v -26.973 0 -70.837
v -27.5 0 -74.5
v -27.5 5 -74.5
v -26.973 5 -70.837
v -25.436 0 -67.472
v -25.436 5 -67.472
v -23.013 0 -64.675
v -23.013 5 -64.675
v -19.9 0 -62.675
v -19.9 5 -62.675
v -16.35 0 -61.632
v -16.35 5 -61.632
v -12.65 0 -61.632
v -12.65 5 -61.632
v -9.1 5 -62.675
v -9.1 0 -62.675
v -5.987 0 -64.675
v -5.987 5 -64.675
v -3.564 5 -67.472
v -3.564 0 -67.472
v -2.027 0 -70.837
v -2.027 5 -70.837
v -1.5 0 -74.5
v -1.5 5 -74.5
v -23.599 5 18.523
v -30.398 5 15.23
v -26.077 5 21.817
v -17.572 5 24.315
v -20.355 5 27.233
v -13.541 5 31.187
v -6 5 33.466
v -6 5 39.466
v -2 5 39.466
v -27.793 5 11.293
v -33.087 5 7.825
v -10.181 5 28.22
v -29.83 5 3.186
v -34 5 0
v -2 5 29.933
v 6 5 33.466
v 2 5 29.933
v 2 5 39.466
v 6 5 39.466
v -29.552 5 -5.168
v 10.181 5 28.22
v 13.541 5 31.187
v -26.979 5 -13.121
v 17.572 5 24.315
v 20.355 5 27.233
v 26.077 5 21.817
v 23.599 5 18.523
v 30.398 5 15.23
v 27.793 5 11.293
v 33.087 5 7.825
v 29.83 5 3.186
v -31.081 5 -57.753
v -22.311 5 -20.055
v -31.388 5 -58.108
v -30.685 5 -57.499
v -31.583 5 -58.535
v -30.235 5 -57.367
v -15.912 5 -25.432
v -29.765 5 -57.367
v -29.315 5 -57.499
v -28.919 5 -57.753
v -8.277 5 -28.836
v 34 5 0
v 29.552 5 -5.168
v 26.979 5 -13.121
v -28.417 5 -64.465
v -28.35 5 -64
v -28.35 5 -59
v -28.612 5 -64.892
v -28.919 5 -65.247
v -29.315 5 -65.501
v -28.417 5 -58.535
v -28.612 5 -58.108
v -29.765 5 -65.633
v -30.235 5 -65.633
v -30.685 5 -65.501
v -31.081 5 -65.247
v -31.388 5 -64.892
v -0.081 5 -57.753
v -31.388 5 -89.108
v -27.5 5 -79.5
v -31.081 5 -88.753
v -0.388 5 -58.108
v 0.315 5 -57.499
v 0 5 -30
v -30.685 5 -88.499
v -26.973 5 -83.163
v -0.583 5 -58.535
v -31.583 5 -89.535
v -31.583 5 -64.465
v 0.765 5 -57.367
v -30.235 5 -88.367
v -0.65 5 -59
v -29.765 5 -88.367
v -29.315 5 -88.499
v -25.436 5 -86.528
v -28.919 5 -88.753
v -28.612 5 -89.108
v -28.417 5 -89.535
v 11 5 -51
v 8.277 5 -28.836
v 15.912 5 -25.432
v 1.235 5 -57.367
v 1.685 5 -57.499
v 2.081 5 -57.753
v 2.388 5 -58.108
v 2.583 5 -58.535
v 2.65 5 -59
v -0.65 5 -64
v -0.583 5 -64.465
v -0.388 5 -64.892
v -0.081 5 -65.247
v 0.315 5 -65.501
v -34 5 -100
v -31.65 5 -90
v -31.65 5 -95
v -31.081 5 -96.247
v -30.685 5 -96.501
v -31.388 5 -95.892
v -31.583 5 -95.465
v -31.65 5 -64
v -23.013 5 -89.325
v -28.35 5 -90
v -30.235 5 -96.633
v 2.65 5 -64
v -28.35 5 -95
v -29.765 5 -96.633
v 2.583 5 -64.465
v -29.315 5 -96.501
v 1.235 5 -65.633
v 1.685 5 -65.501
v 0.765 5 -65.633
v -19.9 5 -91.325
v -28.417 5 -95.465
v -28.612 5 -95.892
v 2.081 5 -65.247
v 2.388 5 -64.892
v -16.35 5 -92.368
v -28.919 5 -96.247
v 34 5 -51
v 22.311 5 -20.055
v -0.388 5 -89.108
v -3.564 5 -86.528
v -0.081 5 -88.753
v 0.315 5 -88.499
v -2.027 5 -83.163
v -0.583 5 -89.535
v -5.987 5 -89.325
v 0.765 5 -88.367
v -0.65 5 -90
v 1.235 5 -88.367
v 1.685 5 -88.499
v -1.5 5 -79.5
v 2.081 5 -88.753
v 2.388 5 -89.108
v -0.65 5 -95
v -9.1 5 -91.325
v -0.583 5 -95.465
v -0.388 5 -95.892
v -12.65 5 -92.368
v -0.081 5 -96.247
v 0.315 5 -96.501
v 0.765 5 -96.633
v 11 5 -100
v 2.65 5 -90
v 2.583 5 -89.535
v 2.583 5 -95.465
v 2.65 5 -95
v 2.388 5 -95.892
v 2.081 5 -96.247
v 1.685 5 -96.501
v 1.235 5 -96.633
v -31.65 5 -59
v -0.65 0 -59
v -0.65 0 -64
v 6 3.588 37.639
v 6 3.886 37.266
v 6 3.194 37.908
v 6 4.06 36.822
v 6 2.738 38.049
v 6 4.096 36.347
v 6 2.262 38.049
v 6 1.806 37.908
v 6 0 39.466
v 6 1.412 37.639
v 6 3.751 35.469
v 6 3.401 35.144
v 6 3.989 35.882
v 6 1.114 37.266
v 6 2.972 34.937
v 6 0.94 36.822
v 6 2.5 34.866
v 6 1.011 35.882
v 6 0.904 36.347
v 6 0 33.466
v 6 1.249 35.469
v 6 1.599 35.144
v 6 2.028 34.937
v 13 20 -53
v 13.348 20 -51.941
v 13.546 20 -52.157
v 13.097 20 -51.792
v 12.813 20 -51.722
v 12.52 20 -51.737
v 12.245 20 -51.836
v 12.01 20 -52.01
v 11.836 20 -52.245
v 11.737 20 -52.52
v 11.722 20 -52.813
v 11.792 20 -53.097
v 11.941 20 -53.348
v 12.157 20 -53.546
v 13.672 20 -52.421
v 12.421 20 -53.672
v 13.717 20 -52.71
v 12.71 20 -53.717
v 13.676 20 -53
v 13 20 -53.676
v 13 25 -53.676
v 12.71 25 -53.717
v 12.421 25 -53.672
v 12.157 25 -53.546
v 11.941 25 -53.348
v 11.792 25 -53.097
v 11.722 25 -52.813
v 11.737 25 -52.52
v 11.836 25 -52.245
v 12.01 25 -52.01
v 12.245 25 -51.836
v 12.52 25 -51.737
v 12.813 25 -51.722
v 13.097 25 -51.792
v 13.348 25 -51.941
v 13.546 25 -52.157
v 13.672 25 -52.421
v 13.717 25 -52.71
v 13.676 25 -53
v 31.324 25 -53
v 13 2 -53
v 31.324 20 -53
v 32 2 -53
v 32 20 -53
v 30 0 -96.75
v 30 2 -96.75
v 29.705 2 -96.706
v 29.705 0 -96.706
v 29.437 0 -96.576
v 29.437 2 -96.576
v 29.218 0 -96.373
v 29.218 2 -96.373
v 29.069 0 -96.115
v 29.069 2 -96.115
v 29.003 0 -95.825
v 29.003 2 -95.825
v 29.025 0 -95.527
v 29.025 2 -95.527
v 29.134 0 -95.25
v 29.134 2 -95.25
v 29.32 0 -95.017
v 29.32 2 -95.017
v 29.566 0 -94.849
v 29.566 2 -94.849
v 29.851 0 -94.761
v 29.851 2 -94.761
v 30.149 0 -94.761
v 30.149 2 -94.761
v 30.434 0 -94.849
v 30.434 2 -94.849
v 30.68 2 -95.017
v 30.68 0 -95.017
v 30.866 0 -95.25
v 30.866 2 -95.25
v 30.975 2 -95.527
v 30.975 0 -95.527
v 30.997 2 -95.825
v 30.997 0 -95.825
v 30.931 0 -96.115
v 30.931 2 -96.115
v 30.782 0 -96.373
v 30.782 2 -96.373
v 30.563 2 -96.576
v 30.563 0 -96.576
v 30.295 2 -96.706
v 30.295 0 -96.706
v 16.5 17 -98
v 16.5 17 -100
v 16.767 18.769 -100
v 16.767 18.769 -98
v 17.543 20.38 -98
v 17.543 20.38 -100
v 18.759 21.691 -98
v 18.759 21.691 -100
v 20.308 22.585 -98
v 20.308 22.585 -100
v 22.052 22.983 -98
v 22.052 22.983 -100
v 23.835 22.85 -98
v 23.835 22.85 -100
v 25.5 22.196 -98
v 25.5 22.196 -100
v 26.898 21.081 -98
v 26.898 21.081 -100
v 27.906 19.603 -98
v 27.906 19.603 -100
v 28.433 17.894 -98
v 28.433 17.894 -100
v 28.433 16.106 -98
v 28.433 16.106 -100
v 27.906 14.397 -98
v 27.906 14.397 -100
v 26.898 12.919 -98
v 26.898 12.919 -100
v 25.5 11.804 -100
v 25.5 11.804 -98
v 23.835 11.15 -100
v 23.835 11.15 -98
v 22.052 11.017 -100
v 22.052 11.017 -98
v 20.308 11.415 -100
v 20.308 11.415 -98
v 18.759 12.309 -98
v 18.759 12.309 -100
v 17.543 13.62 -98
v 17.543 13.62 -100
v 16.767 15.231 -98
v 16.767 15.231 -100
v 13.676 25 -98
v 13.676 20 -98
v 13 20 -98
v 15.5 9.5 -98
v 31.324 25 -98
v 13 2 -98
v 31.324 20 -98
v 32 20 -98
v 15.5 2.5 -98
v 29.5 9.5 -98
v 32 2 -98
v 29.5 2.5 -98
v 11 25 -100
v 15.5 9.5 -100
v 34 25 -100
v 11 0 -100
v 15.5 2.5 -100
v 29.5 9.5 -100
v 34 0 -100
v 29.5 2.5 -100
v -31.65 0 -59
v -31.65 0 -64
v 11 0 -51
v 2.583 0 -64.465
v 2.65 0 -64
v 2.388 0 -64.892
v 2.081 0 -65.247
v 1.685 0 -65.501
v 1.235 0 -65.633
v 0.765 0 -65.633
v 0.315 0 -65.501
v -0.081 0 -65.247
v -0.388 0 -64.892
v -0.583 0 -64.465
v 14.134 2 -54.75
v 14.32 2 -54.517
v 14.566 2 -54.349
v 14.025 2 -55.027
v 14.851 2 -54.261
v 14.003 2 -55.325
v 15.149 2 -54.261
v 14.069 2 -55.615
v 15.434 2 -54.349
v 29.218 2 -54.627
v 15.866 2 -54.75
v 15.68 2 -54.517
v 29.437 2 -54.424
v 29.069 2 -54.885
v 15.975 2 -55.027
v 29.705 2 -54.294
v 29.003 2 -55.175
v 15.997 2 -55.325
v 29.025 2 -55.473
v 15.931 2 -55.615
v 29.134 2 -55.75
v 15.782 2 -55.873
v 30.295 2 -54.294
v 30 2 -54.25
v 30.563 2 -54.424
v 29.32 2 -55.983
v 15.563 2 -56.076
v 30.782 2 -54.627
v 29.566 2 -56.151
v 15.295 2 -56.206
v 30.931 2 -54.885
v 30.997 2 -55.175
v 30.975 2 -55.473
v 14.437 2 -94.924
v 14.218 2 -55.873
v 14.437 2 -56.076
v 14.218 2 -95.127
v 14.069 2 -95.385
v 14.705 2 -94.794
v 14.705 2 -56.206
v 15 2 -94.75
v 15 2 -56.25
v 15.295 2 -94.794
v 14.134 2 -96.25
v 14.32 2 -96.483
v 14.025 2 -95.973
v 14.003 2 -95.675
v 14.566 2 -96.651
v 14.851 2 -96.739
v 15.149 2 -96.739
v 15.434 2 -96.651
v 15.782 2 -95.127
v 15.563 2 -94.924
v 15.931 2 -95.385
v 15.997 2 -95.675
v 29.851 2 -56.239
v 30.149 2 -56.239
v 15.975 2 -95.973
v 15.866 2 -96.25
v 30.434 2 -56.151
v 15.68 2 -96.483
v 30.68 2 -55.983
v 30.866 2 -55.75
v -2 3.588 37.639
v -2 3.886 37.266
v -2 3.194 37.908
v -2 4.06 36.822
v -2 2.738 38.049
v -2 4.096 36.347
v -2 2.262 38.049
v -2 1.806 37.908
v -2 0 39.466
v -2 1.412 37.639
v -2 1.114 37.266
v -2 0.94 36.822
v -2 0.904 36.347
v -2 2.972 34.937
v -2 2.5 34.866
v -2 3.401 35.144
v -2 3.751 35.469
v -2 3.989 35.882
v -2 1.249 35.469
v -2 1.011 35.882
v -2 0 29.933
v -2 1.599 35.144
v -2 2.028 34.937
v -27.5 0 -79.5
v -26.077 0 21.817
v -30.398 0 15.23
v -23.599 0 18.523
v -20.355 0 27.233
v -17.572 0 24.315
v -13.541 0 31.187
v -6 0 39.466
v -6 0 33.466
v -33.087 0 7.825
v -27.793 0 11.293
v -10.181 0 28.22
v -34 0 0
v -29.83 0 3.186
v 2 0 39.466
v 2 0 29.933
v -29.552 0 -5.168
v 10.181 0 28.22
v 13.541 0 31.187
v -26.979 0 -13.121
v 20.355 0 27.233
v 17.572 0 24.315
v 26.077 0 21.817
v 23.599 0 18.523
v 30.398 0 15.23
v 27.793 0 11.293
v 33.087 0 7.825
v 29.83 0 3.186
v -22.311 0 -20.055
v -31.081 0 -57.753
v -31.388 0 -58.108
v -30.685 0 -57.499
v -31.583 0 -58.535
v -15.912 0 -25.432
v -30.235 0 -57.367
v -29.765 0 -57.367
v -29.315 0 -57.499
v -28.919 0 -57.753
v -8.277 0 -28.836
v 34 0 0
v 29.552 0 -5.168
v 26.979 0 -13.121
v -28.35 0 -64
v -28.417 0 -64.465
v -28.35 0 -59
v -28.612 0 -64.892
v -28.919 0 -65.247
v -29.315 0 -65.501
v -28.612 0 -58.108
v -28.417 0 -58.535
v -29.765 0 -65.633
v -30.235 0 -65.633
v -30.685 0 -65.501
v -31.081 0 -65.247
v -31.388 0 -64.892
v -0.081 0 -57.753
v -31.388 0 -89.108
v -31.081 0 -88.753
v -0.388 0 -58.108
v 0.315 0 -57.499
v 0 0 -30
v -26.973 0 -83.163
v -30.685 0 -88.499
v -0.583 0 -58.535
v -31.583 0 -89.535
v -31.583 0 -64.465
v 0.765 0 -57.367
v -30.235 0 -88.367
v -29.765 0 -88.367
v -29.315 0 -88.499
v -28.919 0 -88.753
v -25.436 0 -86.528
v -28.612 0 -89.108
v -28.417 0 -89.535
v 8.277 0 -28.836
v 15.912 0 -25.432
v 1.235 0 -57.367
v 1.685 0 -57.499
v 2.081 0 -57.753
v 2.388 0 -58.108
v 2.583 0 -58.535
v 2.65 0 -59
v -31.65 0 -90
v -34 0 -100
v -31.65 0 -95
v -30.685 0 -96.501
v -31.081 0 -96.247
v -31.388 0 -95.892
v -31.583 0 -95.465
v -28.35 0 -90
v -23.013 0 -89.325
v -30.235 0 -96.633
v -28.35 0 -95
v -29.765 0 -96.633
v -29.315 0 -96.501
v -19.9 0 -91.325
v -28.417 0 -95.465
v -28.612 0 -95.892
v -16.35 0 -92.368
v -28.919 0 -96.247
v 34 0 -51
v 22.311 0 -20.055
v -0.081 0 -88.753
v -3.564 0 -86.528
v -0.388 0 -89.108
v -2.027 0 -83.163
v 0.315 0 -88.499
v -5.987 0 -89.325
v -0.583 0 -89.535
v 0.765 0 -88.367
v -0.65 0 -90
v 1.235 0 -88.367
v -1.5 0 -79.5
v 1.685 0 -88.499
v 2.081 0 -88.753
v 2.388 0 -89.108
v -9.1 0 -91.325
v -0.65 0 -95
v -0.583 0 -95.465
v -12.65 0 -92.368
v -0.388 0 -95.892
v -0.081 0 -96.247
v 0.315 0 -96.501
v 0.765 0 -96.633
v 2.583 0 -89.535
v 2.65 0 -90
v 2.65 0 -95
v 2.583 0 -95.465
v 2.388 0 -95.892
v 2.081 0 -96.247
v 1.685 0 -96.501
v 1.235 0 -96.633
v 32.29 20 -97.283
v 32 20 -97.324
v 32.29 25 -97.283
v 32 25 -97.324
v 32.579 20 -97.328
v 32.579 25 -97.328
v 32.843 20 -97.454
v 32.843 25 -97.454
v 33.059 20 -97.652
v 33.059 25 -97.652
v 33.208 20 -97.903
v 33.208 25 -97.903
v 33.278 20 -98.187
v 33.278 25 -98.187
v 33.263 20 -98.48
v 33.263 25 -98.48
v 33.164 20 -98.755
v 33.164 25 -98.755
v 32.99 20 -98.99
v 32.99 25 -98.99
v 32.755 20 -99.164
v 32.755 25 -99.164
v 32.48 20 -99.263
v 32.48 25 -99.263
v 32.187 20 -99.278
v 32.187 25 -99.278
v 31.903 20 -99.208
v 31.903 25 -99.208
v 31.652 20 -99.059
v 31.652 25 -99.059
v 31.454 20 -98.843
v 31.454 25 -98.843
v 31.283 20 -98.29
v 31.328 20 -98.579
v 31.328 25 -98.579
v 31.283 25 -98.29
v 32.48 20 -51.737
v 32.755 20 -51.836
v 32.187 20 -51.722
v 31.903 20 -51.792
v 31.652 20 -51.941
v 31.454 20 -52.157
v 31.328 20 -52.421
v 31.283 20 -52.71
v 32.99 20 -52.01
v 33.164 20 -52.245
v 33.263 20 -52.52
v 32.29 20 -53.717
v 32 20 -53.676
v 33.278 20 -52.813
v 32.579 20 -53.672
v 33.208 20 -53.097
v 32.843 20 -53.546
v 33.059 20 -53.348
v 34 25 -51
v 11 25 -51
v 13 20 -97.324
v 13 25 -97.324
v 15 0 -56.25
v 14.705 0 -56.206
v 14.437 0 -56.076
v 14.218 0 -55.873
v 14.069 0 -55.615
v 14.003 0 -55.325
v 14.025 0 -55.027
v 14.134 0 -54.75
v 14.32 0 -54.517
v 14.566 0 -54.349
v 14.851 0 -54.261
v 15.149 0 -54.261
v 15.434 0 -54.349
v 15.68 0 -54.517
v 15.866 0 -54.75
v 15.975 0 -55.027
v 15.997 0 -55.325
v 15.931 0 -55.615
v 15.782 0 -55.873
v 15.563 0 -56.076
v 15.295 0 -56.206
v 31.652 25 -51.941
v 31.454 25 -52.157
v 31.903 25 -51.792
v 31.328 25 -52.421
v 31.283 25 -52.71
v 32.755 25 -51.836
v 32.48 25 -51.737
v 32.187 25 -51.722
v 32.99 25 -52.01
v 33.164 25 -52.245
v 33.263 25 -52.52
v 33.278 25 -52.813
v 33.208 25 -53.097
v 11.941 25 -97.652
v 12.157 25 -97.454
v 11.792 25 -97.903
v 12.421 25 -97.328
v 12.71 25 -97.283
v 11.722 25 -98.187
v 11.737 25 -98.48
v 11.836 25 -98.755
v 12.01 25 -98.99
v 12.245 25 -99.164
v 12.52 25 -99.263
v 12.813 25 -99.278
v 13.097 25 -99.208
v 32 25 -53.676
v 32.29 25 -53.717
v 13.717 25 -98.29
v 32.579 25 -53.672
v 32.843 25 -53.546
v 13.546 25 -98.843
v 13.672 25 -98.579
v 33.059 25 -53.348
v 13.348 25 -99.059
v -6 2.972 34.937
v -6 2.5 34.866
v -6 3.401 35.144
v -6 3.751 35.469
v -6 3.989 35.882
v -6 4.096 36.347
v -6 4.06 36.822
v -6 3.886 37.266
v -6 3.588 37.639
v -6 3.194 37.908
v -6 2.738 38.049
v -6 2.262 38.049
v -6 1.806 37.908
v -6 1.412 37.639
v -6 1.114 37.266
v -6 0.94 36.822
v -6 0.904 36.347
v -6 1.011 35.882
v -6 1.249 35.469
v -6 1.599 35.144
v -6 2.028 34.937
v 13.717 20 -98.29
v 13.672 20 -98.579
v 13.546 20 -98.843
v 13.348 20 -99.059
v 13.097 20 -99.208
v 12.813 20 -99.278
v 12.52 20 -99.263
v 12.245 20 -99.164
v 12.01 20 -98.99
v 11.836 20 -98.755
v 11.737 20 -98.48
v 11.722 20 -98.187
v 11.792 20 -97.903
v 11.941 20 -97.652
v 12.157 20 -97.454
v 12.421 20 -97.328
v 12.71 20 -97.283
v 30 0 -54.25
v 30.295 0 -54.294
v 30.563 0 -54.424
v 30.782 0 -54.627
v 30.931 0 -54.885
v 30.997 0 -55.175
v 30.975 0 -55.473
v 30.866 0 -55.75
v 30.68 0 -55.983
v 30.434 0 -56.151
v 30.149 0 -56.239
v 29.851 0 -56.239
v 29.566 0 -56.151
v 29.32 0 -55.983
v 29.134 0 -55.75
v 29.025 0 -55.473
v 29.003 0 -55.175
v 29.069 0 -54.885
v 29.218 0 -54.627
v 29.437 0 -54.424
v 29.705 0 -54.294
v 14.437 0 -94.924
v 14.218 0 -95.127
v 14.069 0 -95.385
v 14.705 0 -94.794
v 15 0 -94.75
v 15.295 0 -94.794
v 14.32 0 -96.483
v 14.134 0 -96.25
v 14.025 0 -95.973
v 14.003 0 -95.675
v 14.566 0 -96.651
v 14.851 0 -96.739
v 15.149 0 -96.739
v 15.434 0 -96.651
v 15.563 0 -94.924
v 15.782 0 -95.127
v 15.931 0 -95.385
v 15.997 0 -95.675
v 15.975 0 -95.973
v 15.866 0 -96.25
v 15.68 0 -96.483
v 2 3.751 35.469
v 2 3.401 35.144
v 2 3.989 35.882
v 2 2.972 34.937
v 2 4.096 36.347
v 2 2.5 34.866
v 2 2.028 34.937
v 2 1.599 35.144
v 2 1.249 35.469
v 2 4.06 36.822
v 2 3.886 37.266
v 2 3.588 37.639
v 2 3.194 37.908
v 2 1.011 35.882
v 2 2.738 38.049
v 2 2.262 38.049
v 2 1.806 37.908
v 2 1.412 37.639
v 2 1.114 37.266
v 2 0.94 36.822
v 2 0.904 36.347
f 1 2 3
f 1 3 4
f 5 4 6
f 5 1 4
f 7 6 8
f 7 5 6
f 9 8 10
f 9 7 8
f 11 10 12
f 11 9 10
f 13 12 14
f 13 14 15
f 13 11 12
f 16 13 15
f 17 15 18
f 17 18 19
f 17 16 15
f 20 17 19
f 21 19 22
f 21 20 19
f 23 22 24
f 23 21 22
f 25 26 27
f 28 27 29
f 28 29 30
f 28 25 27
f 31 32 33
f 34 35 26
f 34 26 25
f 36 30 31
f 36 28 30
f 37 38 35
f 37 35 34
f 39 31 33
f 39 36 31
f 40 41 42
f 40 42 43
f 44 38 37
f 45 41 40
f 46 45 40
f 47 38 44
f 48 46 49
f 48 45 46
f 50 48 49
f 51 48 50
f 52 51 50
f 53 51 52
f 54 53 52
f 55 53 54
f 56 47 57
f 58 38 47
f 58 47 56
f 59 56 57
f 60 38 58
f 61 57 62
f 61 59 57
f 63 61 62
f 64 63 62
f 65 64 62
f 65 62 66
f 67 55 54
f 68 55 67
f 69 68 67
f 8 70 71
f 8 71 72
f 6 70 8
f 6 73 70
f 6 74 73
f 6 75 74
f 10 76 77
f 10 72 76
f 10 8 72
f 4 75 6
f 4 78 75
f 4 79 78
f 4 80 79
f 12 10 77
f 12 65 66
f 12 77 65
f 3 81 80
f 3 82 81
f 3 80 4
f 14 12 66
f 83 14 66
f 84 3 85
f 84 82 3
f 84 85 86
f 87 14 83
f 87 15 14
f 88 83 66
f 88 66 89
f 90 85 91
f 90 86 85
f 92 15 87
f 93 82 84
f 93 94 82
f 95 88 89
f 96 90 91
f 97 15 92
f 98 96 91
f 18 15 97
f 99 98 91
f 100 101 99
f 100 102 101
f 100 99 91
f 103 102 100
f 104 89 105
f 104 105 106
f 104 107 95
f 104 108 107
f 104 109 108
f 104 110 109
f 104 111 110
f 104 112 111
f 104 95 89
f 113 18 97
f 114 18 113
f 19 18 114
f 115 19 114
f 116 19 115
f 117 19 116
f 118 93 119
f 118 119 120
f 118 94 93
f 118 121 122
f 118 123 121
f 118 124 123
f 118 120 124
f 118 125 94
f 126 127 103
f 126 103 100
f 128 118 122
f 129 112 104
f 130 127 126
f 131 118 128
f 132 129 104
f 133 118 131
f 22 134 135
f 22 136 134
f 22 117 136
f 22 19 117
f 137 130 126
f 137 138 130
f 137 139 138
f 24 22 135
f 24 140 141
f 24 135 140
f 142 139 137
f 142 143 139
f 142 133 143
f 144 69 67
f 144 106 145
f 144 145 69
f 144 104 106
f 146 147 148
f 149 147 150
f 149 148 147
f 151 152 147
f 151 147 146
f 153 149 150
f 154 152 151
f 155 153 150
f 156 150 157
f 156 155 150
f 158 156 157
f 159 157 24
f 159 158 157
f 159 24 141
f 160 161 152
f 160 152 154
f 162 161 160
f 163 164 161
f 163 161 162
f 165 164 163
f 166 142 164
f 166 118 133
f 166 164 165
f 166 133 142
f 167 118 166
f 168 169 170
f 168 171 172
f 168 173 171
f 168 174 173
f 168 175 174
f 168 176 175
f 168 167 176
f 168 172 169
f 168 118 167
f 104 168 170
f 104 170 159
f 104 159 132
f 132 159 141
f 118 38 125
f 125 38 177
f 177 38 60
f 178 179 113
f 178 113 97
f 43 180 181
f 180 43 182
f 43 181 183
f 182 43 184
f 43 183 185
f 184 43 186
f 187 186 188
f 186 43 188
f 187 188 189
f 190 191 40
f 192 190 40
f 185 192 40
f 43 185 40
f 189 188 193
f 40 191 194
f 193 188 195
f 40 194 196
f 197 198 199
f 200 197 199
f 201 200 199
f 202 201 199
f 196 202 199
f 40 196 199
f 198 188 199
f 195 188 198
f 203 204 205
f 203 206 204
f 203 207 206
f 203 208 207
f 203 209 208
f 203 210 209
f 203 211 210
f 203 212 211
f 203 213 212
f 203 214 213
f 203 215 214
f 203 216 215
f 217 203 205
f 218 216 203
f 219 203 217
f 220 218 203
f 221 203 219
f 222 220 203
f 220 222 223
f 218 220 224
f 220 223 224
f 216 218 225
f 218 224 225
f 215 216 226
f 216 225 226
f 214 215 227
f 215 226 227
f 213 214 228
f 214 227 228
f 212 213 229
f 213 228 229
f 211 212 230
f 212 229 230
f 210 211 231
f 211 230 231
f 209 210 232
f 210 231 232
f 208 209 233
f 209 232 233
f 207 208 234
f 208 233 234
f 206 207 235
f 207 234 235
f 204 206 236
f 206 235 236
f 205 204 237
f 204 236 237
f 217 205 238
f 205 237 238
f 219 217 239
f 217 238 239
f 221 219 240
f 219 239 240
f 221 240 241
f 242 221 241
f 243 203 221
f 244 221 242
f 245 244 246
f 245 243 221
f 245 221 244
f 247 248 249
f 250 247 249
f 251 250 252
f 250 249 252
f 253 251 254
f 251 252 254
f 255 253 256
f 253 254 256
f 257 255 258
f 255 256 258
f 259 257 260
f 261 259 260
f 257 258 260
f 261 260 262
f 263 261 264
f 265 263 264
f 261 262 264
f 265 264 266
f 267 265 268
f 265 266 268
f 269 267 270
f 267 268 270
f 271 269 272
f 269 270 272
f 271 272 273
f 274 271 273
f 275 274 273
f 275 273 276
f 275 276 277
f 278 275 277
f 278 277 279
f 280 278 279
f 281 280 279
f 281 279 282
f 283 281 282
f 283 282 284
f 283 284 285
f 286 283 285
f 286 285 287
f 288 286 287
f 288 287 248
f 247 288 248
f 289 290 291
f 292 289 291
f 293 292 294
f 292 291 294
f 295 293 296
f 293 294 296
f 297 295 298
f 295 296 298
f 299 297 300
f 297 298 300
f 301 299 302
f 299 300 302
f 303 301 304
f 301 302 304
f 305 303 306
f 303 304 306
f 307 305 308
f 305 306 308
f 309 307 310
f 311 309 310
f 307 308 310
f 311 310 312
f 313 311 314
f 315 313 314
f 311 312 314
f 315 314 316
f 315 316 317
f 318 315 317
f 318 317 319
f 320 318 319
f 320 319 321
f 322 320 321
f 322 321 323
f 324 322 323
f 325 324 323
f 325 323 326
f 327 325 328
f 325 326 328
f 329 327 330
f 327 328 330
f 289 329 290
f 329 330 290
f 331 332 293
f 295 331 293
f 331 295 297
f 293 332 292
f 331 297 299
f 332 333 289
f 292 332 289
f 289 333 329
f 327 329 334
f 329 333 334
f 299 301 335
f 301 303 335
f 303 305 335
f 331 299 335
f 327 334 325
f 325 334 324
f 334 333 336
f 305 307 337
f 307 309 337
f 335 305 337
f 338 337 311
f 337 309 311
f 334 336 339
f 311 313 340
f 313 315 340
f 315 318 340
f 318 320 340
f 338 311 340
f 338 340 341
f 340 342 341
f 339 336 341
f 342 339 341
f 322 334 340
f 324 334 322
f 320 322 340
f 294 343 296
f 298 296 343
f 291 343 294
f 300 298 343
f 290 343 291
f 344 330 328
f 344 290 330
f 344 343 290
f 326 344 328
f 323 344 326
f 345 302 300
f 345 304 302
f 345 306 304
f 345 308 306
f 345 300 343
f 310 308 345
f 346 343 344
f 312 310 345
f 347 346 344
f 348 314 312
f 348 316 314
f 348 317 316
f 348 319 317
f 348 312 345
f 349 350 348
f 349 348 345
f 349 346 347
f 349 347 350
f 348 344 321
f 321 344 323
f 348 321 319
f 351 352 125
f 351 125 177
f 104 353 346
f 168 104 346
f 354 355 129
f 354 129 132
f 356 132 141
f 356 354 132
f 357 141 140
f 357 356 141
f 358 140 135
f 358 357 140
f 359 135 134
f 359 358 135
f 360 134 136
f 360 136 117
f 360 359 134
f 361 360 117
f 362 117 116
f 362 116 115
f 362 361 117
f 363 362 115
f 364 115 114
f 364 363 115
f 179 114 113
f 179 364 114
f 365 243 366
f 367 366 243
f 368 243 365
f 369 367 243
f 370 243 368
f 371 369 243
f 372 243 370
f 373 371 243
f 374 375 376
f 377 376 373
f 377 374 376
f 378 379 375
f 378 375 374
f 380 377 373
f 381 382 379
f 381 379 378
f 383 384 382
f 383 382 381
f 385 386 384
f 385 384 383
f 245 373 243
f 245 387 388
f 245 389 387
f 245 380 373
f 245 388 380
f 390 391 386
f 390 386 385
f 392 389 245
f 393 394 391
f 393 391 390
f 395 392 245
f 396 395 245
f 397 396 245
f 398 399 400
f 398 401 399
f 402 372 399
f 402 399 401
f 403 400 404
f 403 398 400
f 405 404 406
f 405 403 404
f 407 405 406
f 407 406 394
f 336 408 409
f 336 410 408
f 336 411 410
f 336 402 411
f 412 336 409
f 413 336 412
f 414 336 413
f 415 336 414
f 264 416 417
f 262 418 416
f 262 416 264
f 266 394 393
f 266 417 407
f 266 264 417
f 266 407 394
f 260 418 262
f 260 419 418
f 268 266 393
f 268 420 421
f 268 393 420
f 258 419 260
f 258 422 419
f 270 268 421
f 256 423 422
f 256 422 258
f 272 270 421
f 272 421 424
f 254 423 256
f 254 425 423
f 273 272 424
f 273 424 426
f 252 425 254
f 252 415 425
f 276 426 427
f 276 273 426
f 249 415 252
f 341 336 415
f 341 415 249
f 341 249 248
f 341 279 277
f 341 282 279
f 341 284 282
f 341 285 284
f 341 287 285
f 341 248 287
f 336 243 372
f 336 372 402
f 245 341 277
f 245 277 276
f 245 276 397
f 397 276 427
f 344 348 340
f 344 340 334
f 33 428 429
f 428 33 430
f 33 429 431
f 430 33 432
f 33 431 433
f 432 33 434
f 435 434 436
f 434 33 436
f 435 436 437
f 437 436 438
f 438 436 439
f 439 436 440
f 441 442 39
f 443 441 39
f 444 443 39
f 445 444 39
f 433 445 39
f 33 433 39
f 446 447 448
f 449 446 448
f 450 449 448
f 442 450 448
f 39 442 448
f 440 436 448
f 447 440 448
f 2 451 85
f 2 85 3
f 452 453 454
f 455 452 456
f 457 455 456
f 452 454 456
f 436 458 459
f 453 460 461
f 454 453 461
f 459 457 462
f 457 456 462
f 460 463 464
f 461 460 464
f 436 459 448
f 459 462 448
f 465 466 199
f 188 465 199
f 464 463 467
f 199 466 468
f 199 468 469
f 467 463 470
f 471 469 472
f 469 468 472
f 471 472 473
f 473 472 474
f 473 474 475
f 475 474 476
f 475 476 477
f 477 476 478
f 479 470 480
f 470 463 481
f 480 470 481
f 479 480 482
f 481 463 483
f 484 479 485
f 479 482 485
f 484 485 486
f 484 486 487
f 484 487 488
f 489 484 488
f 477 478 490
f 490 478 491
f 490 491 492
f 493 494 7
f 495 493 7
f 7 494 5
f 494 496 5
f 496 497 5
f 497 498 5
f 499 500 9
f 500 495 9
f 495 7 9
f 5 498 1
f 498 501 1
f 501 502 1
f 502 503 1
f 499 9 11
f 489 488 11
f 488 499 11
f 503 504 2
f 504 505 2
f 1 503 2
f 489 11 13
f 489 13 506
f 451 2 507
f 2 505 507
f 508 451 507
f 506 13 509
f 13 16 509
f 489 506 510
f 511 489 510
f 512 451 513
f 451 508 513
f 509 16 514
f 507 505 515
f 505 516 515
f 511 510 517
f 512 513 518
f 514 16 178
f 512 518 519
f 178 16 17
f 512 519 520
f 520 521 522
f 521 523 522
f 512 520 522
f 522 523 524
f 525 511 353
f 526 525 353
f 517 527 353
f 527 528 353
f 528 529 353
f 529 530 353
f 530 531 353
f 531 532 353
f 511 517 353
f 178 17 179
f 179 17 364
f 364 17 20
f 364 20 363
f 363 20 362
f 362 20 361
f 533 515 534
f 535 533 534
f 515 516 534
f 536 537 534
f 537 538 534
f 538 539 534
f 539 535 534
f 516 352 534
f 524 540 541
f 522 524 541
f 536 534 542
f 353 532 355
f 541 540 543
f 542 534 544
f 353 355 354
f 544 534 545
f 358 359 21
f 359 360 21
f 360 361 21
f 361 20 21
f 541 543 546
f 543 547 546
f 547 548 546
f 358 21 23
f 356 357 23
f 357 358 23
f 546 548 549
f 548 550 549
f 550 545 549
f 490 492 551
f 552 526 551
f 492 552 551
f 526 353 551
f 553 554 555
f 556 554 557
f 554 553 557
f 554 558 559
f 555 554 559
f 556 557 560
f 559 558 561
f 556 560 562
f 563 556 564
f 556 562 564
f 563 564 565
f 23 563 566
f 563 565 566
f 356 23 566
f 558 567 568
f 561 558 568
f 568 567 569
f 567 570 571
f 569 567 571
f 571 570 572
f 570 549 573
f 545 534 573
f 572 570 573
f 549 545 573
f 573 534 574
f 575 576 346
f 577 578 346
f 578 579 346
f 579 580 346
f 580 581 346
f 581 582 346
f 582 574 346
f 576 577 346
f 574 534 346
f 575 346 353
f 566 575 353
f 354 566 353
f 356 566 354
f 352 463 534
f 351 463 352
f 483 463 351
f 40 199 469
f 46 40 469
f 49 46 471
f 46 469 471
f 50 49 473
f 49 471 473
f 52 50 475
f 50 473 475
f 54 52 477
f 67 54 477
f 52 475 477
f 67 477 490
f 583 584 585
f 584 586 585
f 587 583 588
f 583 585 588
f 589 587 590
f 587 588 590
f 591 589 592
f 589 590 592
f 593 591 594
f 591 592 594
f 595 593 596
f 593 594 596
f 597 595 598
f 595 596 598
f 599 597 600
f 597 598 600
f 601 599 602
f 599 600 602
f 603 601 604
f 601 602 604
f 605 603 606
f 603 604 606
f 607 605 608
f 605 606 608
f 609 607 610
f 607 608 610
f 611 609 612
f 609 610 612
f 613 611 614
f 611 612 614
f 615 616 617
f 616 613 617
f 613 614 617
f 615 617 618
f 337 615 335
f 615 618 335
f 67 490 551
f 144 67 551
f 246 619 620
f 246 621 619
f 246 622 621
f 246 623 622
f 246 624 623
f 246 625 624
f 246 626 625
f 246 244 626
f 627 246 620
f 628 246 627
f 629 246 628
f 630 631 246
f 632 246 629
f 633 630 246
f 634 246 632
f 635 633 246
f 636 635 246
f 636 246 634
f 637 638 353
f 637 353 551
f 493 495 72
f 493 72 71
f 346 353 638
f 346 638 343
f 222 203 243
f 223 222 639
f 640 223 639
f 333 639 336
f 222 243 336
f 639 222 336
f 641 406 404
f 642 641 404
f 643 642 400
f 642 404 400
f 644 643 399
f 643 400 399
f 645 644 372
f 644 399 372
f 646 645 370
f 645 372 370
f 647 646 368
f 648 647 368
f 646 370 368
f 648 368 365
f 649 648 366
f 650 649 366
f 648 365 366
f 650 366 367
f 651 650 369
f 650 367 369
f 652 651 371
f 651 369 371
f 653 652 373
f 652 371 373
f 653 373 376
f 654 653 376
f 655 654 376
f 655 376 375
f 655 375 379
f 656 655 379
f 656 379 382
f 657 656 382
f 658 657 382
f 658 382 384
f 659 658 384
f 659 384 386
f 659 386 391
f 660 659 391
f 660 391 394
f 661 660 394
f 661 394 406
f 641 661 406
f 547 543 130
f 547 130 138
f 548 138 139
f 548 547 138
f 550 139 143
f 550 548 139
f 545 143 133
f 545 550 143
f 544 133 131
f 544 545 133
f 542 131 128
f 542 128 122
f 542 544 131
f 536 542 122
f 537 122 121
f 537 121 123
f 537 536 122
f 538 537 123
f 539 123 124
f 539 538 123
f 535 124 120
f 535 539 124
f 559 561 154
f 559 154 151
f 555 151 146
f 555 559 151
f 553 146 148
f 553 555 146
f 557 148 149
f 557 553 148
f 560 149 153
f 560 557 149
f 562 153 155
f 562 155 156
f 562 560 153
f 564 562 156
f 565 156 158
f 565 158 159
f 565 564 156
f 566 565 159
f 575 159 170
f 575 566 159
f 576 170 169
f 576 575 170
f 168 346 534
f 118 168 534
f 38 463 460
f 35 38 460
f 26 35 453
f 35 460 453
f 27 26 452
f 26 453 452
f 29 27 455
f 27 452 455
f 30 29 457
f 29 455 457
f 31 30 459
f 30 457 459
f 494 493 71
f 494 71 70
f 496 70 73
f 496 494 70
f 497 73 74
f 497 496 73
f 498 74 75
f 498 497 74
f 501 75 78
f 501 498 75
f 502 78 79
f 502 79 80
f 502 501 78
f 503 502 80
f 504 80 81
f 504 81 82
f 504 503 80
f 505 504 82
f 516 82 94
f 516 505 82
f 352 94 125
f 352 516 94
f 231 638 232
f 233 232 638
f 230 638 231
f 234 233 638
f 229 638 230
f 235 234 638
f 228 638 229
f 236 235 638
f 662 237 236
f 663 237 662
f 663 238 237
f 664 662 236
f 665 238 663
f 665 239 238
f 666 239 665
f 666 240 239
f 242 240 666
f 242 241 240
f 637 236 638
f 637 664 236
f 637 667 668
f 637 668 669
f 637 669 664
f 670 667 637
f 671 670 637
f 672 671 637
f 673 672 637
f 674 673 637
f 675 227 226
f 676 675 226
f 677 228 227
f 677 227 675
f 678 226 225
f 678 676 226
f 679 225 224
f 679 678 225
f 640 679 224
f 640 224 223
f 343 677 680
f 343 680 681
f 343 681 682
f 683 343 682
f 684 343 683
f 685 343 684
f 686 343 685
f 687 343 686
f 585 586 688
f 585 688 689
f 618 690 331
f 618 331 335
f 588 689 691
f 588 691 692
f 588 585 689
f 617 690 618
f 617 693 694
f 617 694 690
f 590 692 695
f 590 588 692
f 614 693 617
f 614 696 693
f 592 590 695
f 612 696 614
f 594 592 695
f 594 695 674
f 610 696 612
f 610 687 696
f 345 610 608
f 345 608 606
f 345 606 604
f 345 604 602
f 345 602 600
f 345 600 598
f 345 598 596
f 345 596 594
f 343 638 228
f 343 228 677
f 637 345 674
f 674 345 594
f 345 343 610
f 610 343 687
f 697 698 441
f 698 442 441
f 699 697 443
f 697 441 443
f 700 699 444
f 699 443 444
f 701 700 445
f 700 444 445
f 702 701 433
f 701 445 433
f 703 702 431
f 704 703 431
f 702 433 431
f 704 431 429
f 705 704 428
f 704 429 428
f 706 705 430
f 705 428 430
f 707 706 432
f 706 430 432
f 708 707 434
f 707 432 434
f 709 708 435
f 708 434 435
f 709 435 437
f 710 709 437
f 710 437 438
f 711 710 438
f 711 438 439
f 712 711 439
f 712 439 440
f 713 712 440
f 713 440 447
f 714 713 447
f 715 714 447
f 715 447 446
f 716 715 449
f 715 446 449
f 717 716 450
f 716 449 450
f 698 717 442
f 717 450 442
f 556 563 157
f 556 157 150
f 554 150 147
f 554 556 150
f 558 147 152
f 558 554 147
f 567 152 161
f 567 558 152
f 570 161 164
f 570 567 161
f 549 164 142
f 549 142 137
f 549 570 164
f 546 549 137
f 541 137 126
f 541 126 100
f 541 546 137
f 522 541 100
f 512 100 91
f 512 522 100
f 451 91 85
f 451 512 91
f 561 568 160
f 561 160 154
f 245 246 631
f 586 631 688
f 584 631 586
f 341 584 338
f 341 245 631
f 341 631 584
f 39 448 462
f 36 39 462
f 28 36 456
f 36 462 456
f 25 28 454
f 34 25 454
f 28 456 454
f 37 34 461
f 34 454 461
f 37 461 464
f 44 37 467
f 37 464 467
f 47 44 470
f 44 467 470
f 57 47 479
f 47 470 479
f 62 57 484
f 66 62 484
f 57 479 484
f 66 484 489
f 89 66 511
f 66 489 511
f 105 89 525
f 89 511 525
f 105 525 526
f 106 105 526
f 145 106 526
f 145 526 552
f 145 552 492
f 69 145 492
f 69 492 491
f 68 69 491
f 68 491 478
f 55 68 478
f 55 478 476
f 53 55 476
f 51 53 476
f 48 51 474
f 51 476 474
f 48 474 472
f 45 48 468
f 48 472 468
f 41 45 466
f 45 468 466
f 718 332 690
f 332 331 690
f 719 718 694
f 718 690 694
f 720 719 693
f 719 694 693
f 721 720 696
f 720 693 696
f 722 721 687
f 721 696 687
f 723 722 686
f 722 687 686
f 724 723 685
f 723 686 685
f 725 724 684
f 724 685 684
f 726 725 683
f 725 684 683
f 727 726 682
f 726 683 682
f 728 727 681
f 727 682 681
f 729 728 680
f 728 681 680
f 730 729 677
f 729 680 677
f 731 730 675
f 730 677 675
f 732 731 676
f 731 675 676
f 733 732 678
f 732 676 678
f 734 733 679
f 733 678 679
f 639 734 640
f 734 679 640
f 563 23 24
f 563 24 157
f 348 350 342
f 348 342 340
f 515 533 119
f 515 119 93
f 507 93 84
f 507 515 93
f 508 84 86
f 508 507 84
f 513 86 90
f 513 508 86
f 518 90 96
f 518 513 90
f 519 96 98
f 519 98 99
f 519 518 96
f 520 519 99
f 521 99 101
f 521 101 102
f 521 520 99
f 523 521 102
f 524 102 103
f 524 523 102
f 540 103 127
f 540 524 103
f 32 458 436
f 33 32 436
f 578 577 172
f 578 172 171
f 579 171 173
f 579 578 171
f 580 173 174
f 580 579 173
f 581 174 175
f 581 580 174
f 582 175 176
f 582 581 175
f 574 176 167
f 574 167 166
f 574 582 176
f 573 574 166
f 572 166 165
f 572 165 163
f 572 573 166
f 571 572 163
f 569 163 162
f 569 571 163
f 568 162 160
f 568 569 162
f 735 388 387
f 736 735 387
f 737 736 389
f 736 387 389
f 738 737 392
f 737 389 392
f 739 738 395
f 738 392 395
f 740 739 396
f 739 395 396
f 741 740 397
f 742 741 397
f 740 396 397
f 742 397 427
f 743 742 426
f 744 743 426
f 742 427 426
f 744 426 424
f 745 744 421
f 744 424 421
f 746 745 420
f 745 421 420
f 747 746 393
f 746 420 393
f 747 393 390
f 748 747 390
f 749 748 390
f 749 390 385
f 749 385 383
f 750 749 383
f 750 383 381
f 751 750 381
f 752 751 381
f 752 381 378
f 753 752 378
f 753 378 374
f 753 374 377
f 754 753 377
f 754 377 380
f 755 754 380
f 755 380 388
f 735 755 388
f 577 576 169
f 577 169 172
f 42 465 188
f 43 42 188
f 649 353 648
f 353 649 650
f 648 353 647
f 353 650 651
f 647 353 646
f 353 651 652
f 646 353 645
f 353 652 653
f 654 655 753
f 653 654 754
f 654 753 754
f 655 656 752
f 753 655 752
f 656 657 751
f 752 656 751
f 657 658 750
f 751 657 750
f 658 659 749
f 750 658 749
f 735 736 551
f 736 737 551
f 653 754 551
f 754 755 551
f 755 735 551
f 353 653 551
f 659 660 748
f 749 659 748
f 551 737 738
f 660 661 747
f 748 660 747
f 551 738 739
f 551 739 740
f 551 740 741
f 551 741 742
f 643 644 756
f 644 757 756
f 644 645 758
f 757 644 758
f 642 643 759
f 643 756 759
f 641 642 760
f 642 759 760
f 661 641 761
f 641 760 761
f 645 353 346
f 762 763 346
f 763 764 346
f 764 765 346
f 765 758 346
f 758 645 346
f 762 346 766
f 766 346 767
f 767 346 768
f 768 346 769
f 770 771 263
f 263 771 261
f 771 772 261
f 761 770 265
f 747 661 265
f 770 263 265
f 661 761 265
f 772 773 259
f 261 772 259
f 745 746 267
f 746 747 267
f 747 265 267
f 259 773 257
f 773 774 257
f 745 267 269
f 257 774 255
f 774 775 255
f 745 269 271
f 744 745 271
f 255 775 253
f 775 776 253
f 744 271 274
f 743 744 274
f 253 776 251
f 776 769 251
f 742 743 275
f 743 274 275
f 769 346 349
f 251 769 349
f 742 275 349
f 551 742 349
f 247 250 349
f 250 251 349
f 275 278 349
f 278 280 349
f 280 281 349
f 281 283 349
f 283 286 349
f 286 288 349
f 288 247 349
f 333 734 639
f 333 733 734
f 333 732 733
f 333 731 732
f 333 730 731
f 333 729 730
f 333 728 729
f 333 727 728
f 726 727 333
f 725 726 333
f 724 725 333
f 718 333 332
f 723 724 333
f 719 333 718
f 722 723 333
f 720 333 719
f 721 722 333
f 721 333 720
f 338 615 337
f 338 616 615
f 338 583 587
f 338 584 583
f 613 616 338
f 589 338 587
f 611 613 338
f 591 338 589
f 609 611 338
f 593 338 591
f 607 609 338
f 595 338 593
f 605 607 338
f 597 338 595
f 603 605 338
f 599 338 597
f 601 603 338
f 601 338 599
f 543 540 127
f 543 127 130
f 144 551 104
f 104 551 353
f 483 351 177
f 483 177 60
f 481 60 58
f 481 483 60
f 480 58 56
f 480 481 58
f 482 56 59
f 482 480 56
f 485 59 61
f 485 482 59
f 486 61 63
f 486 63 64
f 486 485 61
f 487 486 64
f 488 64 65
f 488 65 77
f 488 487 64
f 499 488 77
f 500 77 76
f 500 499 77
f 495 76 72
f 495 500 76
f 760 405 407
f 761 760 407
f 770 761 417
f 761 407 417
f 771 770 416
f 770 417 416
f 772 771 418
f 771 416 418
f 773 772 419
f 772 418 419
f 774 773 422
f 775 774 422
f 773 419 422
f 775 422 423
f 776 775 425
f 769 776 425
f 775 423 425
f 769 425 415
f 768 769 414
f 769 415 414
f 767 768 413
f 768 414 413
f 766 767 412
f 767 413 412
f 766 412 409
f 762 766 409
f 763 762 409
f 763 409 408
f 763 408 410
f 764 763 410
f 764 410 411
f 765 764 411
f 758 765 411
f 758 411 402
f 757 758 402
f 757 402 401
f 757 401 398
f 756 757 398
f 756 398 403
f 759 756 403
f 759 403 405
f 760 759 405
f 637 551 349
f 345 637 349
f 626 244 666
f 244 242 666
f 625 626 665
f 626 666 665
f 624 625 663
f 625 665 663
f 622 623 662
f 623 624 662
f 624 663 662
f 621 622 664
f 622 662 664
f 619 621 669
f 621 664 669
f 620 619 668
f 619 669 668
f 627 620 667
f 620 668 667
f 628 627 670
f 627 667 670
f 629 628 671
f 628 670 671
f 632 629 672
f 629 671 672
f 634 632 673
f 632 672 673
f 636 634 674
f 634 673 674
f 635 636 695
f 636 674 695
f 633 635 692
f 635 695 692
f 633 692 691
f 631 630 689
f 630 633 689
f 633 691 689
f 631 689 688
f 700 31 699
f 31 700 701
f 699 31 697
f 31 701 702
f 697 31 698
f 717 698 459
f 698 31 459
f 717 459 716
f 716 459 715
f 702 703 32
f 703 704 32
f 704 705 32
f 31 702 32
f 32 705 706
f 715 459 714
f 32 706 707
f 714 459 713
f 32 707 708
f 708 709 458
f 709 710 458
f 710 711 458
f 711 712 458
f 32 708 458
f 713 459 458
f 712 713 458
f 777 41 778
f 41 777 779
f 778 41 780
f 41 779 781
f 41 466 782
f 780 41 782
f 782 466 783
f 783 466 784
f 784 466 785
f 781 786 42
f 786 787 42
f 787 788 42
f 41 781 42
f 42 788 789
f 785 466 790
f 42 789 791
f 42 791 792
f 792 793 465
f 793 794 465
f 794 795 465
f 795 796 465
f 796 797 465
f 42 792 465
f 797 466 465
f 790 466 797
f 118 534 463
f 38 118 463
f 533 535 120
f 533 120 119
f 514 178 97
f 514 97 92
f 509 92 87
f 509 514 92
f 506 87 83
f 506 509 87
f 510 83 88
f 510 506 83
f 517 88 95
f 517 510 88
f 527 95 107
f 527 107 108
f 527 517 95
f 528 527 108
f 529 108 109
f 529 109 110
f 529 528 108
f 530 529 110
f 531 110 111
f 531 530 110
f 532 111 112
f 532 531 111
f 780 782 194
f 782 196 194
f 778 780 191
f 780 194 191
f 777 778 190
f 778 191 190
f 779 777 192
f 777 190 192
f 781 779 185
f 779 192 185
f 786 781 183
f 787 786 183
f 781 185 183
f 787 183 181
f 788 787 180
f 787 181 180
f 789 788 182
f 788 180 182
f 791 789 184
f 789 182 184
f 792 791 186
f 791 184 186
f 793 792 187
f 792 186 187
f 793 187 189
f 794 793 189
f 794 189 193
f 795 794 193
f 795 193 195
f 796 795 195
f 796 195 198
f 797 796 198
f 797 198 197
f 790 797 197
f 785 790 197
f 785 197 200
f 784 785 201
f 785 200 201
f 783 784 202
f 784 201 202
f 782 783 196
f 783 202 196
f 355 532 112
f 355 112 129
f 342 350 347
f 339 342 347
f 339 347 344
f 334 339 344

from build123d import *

# Parameters (mm, degrees)
EXTRUDE_1_DEPTH     = 5
SKETCH_4_R          = 1.6
CUT_EXTRUDE_1_DEPTH = 10
SKETCH_5_W          = 23
SKETCH_5_H          = 49
EXTRUDE_2_DEPTH     = 25
SHELL_1_T           = -2
SKETCH_6_R          = 6
SKETCH_6_W          = 14
SKETCH_6_H          = 7
CUT_EXTRUDE_2_DEPTH = 2
SKETCH_7_R          = 1
CUT_EXTRUDE_3_DEPTH = 5
SKETCH_10_R         = 1
CUT_EXTRUDE_4_DEPTH = 10


with BuildPart() as part:
    # 草图2 → 凸台-拉伸1 (new body)
    with BuildSketch(Plane(origin=(0, 0, 0), x_dir=(1, 0, 0), z_dir=(0, 1, 0))):
        with BuildLine():
            Line((6, -39.466401061), (6, -33.466401061))
            ThreePointArc((6, -33.466401061), (26.076809621, -21.817424229), (34, 0))
            Line((34, 0), (34, 51))
            Line((34, 51), (11, 51))
            Line((11, 51), (11, 100))
            Line((11, 100), (-34, 100))
            Line((-34, 100), (-34, 0))
            ThreePointArc((-34, 0), (-26.076809621, -21.817424229), (-6, -33.466401061))
            Line((-6, -33.466401061), (-6, -39.466401061))
            Line((-6, -39.466401061), (-2, -39.466401061))
            Line((-2, -39.466401061), (-2, -29.933259094))
            ThreePointArc((-2, -29.933259094), (0, 30), (2, -29.933259094))
            Line((2, -29.933259094), (2, -39.466401061))
            Line((2, -39.466401061), (6, -39.466401061))
        make_face()
        with BuildLine():
            ThreePointArc((-0.65, 90), (1, 88.35), (2.65, 90))
            Line((2.65, 90), (2.65, 95))
            ThreePointArc((2.65, 95), (1, 96.65), (-0.65, 95))
            Line((-0.65, 95), (-0.65, 90))
        make_face(mode=Mode.SUBTRACT)
        with BuildLine():
            ThreePointArc((-31.65, 90), (-30, 88.35), (-28.35, 90))
            Line((-28.35, 90), (-28.35, 95))
            ThreePointArc((-28.35, 95), (-30, 96.65), (-31.65, 95))
            Line((-31.65, 95), (-31.65, 90))
        make_face(mode=Mode.SUBTRACT)
        with BuildLine():
            ThreePointArc((-27.5, 74.5), (-14.5, 61.5), (-1.5, 74.5))
            Line((-1.5, 74.5), (-1.5, 79.5))
            ThreePointArc((-1.5, 79.5), (-14.5, 92.5), (-27.5, 79.5))
            Line((-27.5, 79.5), (-27.5, 74.5))
        make_face(mode=Mode.SUBTRACT)
        with BuildLine():
            ThreePointArc((-0.65, 59), (1, 57.35), (2.65, 59))
            Line((2.65, 59), (2.65, 64))
            ThreePointArc((2.65, 64), (1, 65.65), (-0.65, 64))
            Line((-0.65, 64), (-0.65, 59))
        make_face(mode=Mode.SUBTRACT)
        with BuildLine():
            ThreePointArc((-31.65, 59), (-30, 57.35), (-28.35, 59))
            Line((-28.35, 59), (-28.35, 64))
            ThreePointArc((-28.35, 64), (-30, 65.65), (-31.65, 64))
            Line((-31.65, 64), (-31.65, 59))
        make_face(mode=Mode.SUBTRACT)
    extrude(amount=EXTRUDE_1_DEPTH)

    # 草图4 → 切除-拉伸1 (cut, symmetric)
    with BuildSketch(Plane(origin=(0, 0, 0), x_dir=(0, 0, -1), z_dir=(1, 0, 0))):
        with Locations((-36.466401061, 2.5)):
            Circle(SKETCH_4_R)
    extrude(amount=CUT_EXTRUDE_1_DEPTH, both=True, mode=Mode.SUBTRACT)


with BuildPart() as body_2:
    # 草图5 → 凸台-拉伸2 (new body)
    with BuildSketch(Plane(origin=(0, 0, 0), x_dir=(1, 0, 0), z_dir=(0, 1, 0))):
        with Locations((22.5, 75.5)):
            Rectangle(SKETCH_5_W, SKETCH_5_H)
    extrude(amount=EXTRUDE_2_DEPTH)

    # 抽壳1
    shell_1_openings = [body_2.faces().sort_by_distance(p)[0] for p in [
        (22.5, 25, -75.5),
    ]]
    offset(amount=SHELL_1_T, openings=shell_1_openings, kind=Kind.INTERSECTION)

    # 草图6 → 切除-拉伸2 (cut)
    with BuildSketch(Plane(origin=(0, 0, -100), x_dir=(-1, 0, 0), z_dir=(0, 0, -1))):
        with Locations((-22.5, 17)):
            Circle(SKETCH_6_R)
        with Locations((-22.5, 6)):
            Rectangle(SKETCH_6_W, SKETCH_6_H)
    extrude(amount=-CUT_EXTRUDE_2_DEPTH, mode=Mode.SUBTRACT)

    # 草图7 → 切除-拉伸3 (cut)
    with BuildSketch(Plane(origin=(0, 25, 0), x_dir=(1, 0, 0), z_dir=(0, 1, 0))):
        with Locations((12.717157288, 52.717157288)):
            Circle(SKETCH_7_R)
        with Locations((32.282842712, 52.717157288)):
            Circle(SKETCH_7_R)
        with Locations((32.282842712, 98.282842712)):
            Circle(SKETCH_7_R)
        with Locations((12.717157288, 98.282842712)):
            Circle(SKETCH_7_R)
    extrude(amount=-CUT_EXTRUDE_3_DEPTH, mode=Mode.SUBTRACT)

    # 草图10 → 切除-拉伸4 (cut)
    with BuildSketch(Plane(origin=(0, 2, 0), x_dir=(1, 0, 0), z_dir=(0, 1, 0))):
        with Locations(Location((15, 95.75, 0), (0, 0, 270))):
            Circle(SKETCH_10_R)
        with Locations(Location((30, 95.75, 0), (0, 0, 90))):
            Circle(SKETCH_10_R)
        with Locations(Location((30, 55.25, 0), (0, 0, 270))):
            Circle(SKETCH_10_R)
        with Locations(Location((15, 55.25, 0), (0, 0, 90))):
            Circle(SKETCH_10_R)
    extrude(amount=-CUT_EXTRUDE_4_DEPTH, mode=Mode.SUBTRACT)


solid = Compound([part.part, body_2.part])
